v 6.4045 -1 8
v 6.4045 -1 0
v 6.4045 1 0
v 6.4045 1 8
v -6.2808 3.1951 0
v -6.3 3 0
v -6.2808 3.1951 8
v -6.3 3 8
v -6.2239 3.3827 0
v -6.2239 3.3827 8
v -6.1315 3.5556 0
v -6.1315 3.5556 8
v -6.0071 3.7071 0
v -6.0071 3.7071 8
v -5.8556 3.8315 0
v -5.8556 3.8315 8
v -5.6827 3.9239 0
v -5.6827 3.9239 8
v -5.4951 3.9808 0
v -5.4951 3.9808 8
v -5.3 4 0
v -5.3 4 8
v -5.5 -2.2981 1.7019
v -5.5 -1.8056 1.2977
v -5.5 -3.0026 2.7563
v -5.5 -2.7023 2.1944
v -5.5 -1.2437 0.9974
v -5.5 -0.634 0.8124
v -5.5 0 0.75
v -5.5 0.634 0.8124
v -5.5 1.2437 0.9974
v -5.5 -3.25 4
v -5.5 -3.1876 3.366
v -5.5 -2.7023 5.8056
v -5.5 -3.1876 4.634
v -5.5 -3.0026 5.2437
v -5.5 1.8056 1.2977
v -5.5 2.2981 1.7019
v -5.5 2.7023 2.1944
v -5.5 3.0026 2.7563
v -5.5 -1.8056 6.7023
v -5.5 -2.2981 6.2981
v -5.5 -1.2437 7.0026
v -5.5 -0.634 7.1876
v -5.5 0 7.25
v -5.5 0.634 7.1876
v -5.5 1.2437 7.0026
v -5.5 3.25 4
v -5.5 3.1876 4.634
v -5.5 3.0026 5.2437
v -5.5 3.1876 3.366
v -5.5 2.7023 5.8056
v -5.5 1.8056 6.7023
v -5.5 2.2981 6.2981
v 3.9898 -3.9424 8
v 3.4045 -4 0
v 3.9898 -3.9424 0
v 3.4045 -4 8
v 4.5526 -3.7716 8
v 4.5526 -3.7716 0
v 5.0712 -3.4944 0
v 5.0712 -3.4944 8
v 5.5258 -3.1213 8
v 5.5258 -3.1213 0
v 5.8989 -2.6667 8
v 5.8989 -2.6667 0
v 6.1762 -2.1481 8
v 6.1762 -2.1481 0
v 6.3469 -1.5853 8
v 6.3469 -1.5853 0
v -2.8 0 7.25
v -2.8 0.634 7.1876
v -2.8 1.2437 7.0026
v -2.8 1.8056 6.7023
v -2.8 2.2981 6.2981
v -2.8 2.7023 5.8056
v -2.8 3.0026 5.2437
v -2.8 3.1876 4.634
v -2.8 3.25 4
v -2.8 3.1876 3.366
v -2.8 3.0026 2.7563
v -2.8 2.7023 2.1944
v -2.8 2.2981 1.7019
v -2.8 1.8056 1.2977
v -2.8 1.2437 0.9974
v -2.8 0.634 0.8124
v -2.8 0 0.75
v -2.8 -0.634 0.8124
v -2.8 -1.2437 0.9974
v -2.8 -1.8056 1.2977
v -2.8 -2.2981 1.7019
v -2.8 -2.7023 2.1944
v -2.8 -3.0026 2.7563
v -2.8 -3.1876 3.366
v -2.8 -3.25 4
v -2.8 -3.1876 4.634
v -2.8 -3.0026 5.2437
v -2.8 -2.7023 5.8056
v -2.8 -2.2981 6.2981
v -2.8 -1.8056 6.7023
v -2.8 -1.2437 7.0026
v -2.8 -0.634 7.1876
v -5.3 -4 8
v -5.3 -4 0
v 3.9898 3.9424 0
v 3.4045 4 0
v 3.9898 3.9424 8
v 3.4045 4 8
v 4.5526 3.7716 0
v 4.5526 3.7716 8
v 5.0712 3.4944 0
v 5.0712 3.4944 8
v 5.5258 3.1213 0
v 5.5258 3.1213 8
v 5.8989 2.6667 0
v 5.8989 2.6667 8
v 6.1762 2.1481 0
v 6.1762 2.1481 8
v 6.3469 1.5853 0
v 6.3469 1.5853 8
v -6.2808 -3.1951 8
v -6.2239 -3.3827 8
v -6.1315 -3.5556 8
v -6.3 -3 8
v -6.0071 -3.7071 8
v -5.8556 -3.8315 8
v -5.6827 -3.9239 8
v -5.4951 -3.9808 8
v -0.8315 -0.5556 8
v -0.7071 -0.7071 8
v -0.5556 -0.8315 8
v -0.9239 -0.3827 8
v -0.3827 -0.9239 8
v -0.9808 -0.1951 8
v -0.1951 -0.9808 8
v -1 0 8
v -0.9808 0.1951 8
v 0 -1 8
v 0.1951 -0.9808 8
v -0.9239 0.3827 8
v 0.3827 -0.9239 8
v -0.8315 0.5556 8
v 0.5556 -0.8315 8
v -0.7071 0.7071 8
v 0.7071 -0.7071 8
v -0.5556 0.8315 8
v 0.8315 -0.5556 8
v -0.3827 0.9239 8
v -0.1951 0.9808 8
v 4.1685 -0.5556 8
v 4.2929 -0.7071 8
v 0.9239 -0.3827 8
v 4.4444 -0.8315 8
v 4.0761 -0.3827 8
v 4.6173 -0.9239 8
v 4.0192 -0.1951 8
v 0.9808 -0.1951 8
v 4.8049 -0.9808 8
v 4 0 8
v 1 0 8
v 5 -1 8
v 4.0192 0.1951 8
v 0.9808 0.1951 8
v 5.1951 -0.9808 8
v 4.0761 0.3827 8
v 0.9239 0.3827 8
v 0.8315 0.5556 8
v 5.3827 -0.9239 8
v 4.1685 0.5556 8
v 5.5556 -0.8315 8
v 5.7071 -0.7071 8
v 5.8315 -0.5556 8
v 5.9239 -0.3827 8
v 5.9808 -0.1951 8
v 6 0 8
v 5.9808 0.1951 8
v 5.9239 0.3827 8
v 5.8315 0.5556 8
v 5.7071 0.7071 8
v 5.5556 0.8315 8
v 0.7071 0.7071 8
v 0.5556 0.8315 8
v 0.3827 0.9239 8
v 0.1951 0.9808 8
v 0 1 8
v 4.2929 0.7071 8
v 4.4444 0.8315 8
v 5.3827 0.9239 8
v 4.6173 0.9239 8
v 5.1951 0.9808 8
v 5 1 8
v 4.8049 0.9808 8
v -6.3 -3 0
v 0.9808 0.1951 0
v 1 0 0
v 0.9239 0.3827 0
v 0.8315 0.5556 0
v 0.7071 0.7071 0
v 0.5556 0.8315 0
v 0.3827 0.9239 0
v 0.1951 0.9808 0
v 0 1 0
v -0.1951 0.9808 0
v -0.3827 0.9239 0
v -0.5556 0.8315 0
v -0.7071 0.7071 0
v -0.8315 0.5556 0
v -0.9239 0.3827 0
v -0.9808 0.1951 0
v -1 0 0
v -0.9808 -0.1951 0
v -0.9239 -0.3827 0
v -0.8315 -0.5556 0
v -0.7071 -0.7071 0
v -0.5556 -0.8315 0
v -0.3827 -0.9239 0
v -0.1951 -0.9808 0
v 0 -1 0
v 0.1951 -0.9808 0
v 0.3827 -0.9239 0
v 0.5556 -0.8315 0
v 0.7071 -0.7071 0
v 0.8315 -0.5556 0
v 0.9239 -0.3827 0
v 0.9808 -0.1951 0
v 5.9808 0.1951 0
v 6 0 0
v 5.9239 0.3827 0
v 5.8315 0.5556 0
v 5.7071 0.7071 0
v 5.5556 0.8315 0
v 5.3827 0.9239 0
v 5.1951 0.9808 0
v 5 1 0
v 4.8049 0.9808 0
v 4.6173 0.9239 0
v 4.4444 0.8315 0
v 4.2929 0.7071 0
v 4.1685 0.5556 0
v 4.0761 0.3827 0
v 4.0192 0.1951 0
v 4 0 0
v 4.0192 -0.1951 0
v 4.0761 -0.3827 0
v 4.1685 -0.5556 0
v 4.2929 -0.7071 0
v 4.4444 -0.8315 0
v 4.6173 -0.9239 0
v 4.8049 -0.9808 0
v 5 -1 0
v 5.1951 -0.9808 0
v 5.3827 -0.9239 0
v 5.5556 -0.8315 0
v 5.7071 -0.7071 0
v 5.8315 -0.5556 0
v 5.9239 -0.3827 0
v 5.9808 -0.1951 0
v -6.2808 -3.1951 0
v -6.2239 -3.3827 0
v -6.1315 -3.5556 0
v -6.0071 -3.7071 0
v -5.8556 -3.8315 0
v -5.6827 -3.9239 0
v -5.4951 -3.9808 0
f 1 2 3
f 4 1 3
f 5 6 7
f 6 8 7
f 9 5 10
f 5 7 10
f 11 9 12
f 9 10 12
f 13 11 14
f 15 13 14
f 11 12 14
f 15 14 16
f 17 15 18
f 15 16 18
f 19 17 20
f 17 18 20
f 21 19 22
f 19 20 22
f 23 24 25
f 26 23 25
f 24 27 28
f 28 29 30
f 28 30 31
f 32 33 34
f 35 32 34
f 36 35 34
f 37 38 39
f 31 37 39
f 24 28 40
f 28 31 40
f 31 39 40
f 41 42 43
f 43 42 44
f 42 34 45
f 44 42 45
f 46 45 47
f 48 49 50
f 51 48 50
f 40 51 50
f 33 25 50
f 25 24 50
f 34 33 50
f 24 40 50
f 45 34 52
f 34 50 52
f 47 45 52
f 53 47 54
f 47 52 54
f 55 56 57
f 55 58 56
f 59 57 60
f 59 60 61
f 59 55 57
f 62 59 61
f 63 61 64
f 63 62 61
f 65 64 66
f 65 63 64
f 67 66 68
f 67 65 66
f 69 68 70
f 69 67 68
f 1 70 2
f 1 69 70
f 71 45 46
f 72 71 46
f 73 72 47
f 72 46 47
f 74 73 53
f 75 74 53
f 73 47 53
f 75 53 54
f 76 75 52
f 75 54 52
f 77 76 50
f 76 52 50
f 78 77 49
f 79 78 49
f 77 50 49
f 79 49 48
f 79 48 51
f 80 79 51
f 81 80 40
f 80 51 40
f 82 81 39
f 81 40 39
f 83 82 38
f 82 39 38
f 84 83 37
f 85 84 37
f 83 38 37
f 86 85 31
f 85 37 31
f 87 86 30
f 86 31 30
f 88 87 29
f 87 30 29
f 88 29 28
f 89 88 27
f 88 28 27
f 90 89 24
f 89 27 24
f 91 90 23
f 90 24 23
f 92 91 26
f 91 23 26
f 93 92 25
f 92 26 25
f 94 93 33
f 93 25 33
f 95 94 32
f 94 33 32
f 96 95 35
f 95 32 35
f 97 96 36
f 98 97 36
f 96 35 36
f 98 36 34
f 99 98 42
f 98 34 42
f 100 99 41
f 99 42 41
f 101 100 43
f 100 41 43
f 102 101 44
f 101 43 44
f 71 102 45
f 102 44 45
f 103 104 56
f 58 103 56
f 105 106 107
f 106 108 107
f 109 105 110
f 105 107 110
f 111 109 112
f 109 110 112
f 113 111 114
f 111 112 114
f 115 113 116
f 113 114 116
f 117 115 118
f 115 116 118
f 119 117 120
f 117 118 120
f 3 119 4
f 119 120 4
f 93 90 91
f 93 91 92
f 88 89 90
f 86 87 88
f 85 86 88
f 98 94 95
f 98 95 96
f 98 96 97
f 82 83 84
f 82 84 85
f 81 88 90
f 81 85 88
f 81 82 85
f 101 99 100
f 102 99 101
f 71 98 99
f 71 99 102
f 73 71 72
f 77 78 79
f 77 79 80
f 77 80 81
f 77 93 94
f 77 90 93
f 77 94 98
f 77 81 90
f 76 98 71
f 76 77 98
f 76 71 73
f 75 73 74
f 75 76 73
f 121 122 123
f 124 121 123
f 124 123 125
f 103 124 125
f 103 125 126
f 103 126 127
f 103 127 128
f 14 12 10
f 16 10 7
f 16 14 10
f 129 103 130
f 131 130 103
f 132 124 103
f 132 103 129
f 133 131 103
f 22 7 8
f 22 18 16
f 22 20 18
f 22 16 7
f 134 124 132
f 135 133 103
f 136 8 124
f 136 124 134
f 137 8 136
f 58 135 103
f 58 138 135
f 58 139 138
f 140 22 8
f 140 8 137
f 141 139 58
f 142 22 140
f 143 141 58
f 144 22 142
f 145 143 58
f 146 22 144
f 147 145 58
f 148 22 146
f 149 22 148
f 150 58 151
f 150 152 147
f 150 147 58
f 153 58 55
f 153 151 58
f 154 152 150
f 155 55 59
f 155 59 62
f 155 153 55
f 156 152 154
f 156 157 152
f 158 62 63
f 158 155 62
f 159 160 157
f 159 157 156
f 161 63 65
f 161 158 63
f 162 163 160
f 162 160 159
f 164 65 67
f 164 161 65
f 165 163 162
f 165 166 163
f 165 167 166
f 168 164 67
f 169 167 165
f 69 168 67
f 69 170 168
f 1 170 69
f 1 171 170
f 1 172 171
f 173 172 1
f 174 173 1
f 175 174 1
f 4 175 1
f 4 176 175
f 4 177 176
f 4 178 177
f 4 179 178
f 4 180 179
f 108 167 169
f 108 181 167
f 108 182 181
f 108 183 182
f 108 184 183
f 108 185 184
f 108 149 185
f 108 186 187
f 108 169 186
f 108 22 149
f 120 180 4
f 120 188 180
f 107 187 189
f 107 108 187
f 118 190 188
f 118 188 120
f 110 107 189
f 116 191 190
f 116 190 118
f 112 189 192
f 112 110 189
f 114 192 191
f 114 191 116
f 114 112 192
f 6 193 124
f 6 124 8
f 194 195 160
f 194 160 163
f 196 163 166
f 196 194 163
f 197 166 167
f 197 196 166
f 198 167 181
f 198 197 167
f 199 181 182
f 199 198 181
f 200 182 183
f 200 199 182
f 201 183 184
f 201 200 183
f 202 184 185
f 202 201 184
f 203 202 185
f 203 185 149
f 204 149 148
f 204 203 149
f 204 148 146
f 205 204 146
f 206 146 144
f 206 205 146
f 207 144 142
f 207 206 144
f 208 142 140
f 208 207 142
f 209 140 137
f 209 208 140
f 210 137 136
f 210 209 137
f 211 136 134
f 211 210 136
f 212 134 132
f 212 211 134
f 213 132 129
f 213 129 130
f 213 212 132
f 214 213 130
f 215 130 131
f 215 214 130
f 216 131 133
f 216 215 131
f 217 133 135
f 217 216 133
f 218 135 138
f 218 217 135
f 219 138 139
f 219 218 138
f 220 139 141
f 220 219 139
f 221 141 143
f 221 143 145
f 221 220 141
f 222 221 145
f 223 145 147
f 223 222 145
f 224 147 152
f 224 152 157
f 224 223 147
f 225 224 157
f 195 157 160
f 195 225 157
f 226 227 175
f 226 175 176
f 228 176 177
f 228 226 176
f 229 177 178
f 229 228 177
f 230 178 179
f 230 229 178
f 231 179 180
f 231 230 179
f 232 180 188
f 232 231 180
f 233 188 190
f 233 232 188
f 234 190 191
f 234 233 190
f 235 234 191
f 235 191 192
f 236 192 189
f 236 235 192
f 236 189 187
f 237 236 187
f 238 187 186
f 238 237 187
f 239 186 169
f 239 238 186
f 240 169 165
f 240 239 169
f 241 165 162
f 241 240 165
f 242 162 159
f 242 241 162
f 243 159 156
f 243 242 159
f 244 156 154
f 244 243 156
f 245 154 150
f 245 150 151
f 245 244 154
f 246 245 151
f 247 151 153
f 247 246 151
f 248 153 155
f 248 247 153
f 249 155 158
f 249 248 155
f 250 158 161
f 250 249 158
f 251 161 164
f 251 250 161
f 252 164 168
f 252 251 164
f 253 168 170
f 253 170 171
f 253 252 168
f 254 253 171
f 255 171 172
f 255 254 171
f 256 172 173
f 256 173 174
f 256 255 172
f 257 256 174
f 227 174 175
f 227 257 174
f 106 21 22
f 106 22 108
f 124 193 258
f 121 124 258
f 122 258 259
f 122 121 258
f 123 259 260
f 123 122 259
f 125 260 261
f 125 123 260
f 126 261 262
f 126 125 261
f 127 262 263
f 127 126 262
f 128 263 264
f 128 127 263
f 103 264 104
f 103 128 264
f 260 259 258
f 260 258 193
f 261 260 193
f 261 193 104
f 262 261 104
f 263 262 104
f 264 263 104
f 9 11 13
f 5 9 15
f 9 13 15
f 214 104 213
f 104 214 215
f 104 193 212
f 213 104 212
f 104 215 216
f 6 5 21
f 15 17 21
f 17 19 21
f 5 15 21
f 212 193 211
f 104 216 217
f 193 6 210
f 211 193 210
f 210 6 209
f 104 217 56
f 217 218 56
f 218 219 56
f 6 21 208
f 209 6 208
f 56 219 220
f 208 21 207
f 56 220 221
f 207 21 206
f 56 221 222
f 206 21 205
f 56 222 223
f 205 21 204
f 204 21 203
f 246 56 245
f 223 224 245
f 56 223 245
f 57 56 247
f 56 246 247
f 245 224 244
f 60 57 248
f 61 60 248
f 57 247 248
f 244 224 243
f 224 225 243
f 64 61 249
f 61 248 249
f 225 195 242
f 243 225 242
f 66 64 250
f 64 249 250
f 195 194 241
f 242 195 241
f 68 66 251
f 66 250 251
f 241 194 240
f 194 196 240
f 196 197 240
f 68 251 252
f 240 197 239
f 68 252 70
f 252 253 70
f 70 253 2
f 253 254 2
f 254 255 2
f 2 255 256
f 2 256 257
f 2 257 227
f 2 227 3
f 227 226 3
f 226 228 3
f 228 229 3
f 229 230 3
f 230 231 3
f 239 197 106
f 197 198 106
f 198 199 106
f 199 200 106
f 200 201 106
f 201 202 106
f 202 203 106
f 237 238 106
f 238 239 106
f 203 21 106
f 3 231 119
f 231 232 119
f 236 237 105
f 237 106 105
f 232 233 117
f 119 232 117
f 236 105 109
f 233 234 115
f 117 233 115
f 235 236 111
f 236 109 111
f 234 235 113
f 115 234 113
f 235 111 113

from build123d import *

# Parameters (mm, degrees)
SKETCH1_W           = 12.70451268
SKETCH1_H           = 8
SKETCH1_R           = 1
BOSS_EXTRUDE1_DEPTH = 8
CUT_EXTRUDE3_START  = -0.8
SKETCH4_R           = 3.25
CUT_EXTRUDE3_DEPTH  = 2.7
FILLET2_R           = 1
FILLET3_R           = 3


with BuildPart() as part:
    # Sketch1 → Boss-Extrude1 (new body)
    with BuildSketch(Plane.XY):
        with Locations((0.05225634, 0)):
            Rectangle(SKETCH1_W, SKETCH1_H)
        Circle(SKETCH1_R, mode=Mode.SUBTRACT)
        with Locations((5, 0)):
            Circle(SKETCH1_R, mode=Mode.SUBTRACT)
    extrude(amount=BOSS_EXTRUDE1_DEPTH)

    # Sketch4 → Cut-Extrude3 (cut)
    with BuildSketch(Plane.ZY.offset(6.3).offset(CUT_EXTRUDE3_START)):
        with Locations((4, 0)):
            Circle(SKETCH4_R)
    extrude(amount=-CUT_EXTRUDE3_DEPTH, mode=Mode.SUBTRACT)

    # Fillet2
    fillet2_edges = [part.edges().sort_by_distance(p)[0] for p in [
        (-6.3, -4, 4),
        (-6.3, 4, 4),
    ]]
    fillet(fillet2_edges, radius=FILLET2_R)

    # Fillet3
    fillet3_edges = [part.edges().sort_by_distance(p)[0] for p in [
        (6.40451268, 4, 4),
        (6.40451268, -4, 4),
    ]]
    fillet(fillet3_edges, radius=FILLET3_R)


solid = part.part
